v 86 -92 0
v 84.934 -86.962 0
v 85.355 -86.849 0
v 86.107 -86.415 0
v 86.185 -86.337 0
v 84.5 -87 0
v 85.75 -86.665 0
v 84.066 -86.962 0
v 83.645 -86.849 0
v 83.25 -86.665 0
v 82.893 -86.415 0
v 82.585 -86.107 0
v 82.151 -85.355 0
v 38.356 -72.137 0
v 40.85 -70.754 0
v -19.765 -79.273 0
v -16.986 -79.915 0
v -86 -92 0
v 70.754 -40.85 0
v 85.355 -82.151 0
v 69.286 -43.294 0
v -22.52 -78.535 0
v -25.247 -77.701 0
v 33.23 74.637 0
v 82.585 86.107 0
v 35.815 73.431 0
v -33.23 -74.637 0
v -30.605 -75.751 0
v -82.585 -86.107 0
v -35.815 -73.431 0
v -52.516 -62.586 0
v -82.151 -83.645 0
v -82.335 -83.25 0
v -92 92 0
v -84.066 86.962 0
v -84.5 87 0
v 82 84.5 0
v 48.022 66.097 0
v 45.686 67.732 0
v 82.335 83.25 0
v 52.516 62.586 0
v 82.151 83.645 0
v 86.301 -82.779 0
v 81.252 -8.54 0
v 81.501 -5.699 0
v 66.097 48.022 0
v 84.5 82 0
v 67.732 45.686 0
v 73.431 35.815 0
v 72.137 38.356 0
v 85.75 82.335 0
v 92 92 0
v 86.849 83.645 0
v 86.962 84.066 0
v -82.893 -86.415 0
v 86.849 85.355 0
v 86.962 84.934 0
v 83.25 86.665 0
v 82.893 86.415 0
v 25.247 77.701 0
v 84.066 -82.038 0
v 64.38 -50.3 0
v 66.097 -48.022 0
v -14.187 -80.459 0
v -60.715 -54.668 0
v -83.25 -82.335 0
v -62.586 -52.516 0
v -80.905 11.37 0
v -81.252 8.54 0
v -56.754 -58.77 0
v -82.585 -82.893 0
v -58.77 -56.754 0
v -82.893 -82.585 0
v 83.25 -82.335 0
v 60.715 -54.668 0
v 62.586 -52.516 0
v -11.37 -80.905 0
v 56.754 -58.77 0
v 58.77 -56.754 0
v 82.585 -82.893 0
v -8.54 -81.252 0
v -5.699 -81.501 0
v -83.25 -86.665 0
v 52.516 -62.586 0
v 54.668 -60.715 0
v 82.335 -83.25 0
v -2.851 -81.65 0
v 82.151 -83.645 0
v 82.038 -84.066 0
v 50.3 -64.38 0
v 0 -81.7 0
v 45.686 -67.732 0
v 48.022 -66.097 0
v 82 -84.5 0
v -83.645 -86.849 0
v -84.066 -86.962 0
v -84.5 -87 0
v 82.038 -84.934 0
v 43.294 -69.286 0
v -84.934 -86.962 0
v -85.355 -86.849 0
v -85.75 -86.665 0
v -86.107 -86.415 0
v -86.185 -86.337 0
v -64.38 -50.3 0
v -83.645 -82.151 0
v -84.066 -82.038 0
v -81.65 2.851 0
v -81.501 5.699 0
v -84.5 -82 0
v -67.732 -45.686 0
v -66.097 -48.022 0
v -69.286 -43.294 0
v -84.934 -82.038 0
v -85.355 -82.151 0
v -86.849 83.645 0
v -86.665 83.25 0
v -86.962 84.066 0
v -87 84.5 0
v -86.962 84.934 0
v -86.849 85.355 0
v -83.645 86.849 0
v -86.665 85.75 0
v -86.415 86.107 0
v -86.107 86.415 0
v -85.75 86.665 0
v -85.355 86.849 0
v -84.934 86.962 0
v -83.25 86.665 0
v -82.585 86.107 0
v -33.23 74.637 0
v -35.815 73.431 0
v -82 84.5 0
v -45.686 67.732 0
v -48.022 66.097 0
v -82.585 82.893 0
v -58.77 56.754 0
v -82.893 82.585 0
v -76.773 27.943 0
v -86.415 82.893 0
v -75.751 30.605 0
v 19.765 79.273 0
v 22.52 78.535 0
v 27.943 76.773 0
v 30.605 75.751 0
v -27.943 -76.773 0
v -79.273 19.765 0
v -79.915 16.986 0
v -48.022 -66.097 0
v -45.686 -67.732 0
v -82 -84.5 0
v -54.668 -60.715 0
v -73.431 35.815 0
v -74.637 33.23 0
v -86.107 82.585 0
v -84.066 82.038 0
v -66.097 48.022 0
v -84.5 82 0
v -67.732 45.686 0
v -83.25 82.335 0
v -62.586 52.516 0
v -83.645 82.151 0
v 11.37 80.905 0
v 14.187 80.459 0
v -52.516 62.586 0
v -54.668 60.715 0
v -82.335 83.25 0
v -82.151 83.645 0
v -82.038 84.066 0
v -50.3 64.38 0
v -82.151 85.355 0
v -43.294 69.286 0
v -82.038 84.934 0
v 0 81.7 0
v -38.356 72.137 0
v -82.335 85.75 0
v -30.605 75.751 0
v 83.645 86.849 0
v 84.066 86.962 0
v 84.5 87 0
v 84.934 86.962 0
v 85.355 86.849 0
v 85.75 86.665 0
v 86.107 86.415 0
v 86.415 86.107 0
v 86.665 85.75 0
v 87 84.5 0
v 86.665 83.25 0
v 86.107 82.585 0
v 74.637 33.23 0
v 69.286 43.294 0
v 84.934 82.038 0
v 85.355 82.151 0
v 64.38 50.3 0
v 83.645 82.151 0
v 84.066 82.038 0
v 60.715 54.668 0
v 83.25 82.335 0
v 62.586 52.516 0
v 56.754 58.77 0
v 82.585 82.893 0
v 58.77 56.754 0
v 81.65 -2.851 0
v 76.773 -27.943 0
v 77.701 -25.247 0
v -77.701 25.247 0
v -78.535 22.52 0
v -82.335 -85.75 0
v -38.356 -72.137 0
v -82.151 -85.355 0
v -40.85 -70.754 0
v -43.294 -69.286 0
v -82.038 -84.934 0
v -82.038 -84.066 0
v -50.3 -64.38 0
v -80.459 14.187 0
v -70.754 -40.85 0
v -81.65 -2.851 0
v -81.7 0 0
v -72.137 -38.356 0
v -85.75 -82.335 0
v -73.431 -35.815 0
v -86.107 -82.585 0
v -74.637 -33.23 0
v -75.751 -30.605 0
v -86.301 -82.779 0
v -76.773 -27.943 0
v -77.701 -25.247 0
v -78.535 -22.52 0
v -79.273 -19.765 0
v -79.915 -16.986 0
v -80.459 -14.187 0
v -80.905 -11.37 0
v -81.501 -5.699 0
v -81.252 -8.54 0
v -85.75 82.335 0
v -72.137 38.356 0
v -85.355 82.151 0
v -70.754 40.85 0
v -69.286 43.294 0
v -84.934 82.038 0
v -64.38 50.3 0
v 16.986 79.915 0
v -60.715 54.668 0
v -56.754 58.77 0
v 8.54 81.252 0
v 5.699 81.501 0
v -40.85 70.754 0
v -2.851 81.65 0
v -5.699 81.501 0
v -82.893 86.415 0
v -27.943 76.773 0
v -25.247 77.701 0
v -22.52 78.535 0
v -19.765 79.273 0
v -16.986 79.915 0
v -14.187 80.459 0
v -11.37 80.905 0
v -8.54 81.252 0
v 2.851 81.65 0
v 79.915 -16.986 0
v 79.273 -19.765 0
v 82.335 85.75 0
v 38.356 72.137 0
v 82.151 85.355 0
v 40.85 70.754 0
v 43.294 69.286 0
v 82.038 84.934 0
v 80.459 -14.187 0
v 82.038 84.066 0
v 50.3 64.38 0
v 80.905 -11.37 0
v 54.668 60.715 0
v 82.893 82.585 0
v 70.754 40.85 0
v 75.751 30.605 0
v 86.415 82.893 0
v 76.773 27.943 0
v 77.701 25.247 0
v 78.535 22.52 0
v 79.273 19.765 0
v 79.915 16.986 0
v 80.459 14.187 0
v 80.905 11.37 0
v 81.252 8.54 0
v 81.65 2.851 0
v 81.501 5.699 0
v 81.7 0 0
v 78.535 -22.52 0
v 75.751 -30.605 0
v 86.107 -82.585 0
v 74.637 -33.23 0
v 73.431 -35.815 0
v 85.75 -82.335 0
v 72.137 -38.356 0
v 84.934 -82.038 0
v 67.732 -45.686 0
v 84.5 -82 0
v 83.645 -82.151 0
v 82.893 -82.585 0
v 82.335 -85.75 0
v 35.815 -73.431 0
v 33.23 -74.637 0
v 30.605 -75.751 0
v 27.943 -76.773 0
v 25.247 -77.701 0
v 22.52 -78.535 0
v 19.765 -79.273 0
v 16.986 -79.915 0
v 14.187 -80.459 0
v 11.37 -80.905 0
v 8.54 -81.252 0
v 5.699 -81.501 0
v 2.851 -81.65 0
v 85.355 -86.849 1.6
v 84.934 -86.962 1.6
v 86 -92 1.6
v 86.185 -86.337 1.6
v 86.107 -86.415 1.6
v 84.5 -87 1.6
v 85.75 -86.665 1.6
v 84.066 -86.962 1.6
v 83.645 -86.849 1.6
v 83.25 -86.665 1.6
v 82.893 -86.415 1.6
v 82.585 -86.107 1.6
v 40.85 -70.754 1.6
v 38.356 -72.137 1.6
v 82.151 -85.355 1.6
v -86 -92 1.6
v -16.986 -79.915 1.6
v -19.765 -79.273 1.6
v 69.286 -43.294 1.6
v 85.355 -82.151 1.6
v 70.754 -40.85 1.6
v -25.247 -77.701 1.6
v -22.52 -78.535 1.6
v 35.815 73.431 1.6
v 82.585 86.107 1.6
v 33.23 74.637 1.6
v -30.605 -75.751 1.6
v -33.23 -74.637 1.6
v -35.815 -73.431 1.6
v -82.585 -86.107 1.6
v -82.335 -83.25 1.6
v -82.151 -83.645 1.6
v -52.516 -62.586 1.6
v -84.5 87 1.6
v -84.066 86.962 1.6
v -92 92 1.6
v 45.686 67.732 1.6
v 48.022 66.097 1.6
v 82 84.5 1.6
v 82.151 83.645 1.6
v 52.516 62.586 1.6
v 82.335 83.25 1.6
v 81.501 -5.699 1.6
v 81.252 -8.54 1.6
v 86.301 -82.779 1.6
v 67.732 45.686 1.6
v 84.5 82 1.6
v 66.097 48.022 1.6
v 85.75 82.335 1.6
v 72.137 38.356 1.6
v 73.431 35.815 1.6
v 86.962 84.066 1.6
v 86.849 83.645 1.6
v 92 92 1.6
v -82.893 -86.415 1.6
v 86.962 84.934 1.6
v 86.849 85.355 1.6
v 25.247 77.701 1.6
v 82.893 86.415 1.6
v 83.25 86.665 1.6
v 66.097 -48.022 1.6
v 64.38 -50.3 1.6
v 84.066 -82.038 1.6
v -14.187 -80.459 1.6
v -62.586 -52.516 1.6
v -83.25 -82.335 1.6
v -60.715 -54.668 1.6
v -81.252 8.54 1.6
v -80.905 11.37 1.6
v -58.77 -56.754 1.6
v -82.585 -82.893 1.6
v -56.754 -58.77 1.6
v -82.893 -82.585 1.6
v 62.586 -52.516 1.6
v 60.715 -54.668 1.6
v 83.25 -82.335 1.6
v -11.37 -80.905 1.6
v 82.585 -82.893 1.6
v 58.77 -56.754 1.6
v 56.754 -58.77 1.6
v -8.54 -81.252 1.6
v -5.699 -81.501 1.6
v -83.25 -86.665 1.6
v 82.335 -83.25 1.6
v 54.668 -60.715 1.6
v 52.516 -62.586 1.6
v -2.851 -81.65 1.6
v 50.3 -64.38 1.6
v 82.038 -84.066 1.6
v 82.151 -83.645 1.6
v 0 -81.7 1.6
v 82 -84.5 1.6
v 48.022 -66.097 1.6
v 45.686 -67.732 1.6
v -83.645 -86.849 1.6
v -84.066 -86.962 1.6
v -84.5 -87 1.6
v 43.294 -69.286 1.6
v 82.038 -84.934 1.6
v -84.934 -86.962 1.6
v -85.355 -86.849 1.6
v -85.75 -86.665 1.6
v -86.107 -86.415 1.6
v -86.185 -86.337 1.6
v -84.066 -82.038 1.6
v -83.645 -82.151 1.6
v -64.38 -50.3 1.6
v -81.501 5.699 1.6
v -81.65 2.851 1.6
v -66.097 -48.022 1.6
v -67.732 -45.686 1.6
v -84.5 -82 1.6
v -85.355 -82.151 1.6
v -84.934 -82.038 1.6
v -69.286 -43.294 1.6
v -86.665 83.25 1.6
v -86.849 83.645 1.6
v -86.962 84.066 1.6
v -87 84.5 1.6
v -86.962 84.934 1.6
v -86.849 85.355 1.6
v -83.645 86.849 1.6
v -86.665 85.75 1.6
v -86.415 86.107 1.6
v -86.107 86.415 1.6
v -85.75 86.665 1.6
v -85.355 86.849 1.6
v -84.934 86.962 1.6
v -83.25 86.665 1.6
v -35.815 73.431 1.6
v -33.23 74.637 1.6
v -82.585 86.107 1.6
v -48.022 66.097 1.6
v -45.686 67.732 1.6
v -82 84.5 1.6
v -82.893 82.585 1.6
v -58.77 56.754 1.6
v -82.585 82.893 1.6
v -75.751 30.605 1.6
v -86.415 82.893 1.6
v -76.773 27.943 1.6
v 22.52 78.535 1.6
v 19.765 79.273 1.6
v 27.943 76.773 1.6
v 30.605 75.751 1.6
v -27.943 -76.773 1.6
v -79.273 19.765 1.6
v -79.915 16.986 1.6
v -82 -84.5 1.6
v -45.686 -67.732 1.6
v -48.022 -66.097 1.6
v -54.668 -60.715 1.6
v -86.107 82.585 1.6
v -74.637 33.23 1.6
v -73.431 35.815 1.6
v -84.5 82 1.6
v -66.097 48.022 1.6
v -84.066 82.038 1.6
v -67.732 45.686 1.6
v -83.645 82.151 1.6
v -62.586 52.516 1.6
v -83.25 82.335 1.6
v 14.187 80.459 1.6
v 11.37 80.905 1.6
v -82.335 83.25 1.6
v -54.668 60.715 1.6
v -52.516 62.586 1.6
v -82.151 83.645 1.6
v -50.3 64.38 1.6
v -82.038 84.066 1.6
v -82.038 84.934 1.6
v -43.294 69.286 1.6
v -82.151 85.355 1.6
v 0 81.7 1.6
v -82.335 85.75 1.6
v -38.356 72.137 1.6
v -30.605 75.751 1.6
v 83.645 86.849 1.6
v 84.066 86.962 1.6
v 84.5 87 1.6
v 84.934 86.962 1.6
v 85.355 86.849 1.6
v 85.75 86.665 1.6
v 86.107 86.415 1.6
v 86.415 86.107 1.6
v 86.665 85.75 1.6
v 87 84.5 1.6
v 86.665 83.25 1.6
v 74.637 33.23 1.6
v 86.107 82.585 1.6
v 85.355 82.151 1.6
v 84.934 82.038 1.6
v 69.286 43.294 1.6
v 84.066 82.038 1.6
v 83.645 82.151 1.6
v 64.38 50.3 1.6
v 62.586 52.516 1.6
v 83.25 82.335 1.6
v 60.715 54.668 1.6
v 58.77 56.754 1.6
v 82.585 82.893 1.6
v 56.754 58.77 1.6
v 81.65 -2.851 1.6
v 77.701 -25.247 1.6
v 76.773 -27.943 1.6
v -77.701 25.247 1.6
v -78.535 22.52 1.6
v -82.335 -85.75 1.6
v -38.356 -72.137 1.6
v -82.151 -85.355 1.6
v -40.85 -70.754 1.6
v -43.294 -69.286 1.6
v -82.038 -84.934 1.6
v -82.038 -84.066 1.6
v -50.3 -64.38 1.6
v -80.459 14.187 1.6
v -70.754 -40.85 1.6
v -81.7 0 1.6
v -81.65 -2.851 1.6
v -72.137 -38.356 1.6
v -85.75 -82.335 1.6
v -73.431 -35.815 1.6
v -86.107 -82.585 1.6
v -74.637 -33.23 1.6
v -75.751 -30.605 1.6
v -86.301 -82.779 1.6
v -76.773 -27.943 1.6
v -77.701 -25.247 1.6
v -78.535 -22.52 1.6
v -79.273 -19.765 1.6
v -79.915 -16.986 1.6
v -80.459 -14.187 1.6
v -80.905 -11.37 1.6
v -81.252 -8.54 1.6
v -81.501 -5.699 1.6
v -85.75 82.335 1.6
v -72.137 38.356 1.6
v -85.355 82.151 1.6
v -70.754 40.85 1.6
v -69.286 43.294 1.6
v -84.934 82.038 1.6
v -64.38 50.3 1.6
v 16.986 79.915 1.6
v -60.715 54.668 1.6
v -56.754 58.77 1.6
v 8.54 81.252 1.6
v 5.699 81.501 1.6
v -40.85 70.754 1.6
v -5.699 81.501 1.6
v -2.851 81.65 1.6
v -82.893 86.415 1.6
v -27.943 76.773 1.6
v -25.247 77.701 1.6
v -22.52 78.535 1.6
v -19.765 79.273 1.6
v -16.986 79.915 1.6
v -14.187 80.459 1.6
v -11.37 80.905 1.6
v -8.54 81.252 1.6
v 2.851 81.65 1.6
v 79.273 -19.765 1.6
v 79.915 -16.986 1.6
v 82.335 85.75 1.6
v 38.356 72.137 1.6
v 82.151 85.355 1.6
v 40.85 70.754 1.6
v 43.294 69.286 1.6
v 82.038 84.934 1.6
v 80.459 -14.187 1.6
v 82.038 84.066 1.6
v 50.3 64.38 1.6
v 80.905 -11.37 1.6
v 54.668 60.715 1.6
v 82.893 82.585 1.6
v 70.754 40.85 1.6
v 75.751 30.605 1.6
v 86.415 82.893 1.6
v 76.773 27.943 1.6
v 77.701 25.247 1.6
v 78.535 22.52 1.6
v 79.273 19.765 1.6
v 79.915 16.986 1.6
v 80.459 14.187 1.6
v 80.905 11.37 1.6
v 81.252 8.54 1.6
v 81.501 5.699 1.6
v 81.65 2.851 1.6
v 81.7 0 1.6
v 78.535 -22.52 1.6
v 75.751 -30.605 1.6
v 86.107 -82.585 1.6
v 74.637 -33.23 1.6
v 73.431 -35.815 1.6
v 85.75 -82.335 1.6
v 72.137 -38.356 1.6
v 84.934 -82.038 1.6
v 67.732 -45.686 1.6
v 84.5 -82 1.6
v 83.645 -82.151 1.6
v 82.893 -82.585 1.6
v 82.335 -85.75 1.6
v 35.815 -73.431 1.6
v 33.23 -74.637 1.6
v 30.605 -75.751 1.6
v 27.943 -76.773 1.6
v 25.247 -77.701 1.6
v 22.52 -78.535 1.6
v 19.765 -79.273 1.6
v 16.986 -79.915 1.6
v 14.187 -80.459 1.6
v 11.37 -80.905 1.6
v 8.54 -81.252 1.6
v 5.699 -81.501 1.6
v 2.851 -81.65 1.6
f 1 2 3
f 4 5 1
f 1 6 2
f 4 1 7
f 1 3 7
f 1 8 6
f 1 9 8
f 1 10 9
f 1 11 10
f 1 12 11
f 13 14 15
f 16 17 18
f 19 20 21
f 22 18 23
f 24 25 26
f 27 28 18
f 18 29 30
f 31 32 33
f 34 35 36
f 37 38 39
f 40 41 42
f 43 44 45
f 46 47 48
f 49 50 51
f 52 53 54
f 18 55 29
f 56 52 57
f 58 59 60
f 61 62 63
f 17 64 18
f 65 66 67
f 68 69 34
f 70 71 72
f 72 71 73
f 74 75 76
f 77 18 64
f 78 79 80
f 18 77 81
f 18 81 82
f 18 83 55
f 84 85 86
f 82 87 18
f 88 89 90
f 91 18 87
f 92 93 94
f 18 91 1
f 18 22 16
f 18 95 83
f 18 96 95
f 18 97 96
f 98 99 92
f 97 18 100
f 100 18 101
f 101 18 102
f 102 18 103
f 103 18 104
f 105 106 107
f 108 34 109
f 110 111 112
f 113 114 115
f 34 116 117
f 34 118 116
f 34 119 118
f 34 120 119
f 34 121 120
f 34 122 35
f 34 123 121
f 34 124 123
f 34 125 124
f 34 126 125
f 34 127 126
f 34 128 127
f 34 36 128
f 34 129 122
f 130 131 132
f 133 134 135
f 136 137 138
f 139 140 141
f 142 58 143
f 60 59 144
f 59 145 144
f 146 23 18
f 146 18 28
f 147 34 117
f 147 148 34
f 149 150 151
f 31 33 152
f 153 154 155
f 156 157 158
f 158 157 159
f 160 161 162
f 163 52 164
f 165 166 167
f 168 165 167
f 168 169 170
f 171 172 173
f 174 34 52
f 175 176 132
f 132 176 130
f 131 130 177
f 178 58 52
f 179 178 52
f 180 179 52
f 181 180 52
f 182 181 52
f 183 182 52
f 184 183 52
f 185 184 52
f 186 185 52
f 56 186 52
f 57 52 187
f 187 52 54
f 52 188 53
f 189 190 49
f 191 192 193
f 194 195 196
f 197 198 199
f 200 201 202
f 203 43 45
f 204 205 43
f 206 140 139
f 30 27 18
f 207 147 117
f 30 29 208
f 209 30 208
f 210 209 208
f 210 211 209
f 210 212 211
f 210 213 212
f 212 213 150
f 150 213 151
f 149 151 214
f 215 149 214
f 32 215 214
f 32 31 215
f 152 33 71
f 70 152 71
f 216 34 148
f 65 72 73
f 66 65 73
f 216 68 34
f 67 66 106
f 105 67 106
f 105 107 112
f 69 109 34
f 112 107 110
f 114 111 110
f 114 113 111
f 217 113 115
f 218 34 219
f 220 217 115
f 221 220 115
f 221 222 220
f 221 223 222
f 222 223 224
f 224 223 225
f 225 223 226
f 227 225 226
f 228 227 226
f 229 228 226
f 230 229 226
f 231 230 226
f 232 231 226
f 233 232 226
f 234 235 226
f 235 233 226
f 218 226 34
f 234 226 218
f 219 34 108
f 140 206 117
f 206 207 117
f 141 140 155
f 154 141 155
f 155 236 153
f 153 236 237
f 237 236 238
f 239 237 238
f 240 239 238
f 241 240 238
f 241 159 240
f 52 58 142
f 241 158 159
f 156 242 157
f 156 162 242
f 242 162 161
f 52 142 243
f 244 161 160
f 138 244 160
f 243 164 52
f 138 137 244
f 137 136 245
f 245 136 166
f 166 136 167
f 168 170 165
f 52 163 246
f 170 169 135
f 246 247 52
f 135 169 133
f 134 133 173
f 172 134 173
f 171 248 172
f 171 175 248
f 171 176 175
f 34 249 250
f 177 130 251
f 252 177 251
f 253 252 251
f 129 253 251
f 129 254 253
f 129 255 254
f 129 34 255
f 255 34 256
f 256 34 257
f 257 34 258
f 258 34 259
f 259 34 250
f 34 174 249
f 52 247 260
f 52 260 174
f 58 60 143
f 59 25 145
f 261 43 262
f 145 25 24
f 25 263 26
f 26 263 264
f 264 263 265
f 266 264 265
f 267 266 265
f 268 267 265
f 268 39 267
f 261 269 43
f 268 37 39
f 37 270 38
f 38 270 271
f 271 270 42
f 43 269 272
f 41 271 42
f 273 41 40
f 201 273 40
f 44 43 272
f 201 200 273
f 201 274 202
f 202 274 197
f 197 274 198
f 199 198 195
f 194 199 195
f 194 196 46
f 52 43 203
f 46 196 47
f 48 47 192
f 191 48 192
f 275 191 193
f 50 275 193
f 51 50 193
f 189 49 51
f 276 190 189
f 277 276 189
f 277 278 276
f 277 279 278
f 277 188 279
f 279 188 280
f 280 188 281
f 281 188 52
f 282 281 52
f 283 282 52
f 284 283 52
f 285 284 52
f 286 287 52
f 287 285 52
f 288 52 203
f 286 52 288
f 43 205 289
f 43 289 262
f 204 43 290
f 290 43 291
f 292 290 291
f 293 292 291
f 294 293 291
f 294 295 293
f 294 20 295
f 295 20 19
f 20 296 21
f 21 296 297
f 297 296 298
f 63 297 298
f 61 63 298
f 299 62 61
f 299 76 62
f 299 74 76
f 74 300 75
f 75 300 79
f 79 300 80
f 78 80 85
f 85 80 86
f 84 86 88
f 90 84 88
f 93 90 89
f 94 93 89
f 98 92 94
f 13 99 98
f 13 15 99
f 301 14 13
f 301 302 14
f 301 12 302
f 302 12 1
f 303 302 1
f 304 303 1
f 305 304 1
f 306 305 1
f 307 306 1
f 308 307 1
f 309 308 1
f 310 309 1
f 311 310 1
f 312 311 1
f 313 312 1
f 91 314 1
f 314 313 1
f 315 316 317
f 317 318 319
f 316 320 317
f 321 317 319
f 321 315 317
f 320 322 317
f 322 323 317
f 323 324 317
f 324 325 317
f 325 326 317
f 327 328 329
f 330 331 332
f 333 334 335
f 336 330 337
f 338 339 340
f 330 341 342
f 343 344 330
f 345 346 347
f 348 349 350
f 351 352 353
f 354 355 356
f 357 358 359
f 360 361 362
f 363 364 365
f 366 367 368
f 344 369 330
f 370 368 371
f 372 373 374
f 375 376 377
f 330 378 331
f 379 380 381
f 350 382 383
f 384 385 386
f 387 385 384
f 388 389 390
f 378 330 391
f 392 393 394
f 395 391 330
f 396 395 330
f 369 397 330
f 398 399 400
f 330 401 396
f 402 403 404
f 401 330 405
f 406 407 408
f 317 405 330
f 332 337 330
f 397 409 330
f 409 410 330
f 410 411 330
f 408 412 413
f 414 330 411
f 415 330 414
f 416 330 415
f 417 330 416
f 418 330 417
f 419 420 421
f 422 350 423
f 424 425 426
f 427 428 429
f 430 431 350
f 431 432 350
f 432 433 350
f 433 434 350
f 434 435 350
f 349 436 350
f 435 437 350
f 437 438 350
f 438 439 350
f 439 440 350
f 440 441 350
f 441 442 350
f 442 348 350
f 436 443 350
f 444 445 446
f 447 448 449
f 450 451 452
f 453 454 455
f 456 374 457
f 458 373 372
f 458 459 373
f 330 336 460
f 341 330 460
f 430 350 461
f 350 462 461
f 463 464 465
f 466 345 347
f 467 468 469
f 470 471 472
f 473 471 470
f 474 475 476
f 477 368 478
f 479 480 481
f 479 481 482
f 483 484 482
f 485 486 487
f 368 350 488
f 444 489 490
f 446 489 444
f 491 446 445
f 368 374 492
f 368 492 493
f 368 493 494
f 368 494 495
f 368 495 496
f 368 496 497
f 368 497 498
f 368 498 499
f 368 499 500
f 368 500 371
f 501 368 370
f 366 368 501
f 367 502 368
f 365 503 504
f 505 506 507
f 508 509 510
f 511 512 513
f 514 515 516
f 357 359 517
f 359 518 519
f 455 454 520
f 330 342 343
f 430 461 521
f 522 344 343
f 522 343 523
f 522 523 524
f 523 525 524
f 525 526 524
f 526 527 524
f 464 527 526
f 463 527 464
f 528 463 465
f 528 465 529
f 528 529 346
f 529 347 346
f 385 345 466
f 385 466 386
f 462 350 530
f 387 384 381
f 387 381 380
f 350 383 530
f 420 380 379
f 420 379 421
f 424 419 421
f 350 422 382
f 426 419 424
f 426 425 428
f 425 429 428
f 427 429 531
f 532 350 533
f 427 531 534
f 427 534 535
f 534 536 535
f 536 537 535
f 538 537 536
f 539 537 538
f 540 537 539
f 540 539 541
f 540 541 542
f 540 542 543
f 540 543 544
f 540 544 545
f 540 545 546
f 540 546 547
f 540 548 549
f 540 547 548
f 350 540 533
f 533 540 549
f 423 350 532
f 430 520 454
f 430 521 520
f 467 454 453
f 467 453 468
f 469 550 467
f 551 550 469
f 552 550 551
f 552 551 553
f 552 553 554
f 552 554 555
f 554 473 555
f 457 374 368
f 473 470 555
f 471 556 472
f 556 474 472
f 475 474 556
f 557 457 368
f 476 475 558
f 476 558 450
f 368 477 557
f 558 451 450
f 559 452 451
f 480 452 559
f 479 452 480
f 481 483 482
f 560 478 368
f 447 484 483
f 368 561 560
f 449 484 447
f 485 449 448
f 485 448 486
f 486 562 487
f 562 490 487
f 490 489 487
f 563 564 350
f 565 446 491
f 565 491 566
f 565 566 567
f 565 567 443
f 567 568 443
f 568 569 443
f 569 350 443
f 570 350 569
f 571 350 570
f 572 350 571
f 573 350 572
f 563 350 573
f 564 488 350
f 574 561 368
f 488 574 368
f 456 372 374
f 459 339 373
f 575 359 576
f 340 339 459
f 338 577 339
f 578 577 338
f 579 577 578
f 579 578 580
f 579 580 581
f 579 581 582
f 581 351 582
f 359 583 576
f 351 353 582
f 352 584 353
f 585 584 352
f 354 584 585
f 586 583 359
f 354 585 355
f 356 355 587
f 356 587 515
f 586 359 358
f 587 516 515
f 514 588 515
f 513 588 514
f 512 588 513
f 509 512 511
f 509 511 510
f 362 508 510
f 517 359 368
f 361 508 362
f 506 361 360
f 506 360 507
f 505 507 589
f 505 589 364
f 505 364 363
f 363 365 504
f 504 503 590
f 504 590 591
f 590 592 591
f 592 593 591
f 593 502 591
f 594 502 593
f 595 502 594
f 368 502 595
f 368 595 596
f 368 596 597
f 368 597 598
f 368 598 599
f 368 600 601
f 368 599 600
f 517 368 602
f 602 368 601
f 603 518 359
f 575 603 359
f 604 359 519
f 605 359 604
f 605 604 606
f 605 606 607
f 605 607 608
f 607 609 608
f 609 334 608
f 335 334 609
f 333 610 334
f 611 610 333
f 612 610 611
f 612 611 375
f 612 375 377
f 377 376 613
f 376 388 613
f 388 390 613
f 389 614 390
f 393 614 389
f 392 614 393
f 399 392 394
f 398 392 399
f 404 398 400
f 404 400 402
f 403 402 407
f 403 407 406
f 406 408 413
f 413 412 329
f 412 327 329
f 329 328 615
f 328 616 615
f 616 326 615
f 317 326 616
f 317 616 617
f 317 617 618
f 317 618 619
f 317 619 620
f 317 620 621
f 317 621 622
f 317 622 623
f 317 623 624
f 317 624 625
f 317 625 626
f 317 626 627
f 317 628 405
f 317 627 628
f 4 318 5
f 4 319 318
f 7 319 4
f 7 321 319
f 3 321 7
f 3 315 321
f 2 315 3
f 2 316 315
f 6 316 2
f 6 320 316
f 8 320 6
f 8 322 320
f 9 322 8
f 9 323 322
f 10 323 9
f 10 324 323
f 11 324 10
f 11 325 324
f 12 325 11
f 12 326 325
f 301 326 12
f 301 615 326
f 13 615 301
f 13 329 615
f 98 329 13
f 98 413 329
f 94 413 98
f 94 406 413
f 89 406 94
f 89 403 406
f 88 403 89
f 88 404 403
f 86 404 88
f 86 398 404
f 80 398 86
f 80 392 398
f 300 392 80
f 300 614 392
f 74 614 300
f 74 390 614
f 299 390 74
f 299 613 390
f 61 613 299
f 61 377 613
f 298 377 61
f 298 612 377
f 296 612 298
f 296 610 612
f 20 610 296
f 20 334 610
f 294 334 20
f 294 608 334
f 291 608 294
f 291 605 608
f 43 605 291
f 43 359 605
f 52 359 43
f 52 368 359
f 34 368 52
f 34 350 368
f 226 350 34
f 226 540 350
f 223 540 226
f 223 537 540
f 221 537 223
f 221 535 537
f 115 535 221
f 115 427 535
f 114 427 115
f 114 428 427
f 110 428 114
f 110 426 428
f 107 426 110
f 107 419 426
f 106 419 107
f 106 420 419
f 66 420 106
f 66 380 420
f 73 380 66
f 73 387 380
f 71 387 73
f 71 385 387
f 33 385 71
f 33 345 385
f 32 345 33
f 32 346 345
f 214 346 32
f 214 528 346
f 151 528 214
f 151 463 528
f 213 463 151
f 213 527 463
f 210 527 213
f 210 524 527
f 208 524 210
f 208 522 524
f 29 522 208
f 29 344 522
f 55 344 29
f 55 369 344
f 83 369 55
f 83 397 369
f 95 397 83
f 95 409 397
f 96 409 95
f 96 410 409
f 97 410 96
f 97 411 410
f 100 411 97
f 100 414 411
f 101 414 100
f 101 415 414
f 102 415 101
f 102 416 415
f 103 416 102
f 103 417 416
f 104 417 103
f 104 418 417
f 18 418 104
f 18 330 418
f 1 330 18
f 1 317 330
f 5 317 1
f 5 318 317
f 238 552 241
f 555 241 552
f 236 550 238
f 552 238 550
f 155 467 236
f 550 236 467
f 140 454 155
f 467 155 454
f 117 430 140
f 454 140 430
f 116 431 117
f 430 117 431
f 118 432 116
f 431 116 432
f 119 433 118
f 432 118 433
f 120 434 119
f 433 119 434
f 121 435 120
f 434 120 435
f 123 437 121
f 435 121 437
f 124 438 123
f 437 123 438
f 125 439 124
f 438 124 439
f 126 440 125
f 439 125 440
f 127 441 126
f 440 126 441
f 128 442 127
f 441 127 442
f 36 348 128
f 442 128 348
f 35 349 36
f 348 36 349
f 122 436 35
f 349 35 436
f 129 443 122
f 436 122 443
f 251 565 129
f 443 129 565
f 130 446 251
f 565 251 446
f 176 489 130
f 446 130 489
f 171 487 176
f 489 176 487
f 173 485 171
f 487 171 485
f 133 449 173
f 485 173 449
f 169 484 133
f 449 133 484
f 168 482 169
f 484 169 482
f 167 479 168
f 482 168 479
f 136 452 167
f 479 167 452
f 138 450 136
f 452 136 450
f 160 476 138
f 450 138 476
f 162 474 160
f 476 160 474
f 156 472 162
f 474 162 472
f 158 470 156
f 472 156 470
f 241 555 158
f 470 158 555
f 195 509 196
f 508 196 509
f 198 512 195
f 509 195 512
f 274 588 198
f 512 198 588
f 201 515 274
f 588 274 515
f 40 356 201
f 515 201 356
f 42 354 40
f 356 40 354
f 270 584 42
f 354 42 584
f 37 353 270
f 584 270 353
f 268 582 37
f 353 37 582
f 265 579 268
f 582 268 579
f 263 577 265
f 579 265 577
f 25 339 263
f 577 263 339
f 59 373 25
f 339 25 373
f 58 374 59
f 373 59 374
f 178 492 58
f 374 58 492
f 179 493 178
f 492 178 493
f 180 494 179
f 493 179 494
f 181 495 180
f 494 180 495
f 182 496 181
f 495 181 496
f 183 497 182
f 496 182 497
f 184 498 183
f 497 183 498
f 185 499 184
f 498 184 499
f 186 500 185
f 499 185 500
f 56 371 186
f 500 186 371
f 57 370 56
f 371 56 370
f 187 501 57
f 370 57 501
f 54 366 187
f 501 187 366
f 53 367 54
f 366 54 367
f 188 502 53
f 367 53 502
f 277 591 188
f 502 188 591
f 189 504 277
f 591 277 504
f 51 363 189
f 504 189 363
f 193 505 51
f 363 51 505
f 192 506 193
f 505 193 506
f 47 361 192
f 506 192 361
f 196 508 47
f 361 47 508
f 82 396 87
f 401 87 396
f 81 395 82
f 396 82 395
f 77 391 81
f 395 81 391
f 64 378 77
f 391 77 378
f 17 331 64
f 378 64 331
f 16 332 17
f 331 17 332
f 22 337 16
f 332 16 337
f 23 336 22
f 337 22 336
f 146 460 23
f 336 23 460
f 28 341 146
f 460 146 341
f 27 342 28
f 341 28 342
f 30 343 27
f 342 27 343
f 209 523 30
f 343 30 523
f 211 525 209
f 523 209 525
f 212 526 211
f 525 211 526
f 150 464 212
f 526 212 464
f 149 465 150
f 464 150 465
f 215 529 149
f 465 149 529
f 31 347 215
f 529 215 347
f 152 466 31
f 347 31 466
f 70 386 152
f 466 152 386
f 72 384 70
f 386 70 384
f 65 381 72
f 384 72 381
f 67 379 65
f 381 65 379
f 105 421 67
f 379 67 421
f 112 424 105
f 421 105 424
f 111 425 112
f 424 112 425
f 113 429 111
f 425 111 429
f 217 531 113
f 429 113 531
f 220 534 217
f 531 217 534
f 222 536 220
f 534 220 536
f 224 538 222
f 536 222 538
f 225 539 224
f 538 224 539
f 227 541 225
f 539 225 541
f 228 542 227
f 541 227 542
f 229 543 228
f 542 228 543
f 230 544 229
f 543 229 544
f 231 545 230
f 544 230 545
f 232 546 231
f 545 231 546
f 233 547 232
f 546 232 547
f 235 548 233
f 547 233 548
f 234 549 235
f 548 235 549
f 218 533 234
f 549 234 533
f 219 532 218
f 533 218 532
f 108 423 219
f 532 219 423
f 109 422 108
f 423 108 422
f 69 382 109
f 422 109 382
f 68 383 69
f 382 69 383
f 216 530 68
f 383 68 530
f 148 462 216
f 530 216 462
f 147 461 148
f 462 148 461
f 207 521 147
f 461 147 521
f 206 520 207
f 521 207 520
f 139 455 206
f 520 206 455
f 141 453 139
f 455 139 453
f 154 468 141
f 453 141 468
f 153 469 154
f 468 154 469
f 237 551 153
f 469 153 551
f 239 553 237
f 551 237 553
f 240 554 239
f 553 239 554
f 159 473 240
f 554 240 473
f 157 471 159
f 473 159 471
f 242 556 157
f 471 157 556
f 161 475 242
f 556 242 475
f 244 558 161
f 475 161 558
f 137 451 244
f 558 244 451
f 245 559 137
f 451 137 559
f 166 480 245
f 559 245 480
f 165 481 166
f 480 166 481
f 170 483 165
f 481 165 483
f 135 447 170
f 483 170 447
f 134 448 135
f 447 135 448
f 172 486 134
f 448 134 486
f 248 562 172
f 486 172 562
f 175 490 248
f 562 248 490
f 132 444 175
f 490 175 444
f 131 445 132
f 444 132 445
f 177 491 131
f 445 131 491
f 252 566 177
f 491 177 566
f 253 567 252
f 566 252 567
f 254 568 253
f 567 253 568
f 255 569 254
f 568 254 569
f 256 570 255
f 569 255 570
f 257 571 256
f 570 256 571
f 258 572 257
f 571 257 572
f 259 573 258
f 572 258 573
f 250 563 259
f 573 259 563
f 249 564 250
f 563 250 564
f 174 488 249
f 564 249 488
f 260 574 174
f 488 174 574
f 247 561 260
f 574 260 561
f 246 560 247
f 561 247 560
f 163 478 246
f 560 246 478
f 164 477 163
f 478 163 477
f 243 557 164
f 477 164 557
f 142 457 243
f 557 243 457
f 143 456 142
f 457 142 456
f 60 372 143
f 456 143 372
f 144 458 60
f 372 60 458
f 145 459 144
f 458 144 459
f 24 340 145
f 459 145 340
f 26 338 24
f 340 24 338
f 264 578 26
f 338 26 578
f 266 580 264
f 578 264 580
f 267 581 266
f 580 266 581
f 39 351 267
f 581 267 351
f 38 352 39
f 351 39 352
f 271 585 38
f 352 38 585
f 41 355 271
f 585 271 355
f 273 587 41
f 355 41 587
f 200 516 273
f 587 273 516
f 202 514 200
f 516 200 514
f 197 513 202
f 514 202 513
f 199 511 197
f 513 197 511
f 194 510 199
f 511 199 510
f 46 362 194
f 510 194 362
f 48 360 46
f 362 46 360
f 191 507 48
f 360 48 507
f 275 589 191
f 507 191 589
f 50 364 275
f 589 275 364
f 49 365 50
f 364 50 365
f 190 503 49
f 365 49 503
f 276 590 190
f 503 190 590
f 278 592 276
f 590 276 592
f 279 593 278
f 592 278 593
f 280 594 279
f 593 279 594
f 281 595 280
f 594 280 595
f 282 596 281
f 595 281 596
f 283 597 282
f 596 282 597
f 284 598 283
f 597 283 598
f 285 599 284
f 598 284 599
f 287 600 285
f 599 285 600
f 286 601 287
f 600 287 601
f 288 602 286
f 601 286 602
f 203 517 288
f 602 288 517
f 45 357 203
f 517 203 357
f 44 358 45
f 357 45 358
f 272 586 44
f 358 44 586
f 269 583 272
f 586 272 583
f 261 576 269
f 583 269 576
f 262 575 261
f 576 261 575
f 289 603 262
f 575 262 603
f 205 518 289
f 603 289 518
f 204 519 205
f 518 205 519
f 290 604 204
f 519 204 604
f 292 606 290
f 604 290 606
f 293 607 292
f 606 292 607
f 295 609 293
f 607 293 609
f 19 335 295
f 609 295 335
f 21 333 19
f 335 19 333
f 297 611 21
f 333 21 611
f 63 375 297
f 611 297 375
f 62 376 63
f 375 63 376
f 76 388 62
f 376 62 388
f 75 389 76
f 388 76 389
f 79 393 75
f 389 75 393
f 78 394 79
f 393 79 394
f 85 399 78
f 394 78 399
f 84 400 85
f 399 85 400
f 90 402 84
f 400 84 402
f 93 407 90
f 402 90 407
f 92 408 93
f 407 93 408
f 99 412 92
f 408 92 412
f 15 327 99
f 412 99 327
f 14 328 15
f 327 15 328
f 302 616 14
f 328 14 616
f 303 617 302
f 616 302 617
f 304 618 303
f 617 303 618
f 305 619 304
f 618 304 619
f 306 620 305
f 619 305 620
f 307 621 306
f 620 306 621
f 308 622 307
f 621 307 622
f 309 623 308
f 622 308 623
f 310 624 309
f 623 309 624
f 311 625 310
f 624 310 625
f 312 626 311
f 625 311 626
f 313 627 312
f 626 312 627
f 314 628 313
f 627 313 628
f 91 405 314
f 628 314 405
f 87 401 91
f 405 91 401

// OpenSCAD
// part_id: fp2
// name: Front panel dial frame
// source_drawing_ids: DRW-010
// units: mm
// revision: 0.1
// SPDX-License-Identifier: MIT

module fp2_profile_2d(
    panel_w = 184.0,
    panel_h = 184.0,
    panel_taper = 6.0,
    center_cutout_d = 163.4,
    mount_hole_d = 5.0,
    hole_offset = 7.5
) {
    difference() {
        polygon(points = [
            [-panel_w / 2 + panel_taper, -panel_h / 2],
            [ panel_w / 2 - panel_taper, -panel_h / 2],
            [ panel_w / 2, panel_h / 2],
            [-panel_w / 2, panel_h / 2]
        ]);

        circle(d = center_cutout_d, $fn = 180);

        for (sx = [-1, 1], sy = [-1, 1]) {
            translate([sx * (panel_w / 2 - hole_offset), sy * (panel_h / 2 - hole_offset)])
                circle(d = mount_hole_d, $fn = 36);
        }
    }
}

module part_fp2(
    thickness = 1.6
) {
    linear_extrude(height = thickness)
        fp2_profile_2d();
}

// ---- "main guard" ----
// Default to previewing when opened directly:
if (is_undef(__LIB_MODE__)) {
    part_fp2();
}
